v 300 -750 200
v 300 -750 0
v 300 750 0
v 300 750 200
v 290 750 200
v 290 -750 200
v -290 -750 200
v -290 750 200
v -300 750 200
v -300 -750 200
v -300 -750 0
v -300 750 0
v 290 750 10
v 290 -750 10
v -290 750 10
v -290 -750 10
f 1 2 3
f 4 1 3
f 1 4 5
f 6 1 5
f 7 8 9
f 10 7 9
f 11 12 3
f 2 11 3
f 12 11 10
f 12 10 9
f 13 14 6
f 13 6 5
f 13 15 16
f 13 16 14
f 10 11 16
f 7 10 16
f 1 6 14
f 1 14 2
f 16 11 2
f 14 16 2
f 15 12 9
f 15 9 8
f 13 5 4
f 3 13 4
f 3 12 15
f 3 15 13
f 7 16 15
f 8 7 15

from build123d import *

# Parameters (mm, degrees)
SKETCH2_W           = 600
SKETCH2_H           = 1500
BOSS_EXTRUDE1_DEPTH = 10
SKETCH5_W           = 10
SKETCH5_H           = 1500
EXTRUDE_THIN2_DEPTH = 200


with BuildPart() as part:
    # Sketch2 → Boss-Extrude1 (new body)
    with BuildSketch(Plane.XY):
        Rectangle(SKETCH2_W, SKETCH2_H)
    extrude(amount=BOSS_EXTRUDE1_DEPTH)

    # Sketch5 → Extrude-Thin2 (add)
    with BuildSketch(Plane(origin=(0, 0, 0), x_dir=(-1, 0, 0), z_dir=(0, 0, -1))):
        with Locations((-295, 0)):
            Rectangle(SKETCH5_W, SKETCH5_H)
        with Locations((295, 0)):
            Rectangle(SKETCH5_W, SKETCH5_H)
    extrude(amount=-EXTRUDE_THIN2_DEPTH)


solid = part.part
